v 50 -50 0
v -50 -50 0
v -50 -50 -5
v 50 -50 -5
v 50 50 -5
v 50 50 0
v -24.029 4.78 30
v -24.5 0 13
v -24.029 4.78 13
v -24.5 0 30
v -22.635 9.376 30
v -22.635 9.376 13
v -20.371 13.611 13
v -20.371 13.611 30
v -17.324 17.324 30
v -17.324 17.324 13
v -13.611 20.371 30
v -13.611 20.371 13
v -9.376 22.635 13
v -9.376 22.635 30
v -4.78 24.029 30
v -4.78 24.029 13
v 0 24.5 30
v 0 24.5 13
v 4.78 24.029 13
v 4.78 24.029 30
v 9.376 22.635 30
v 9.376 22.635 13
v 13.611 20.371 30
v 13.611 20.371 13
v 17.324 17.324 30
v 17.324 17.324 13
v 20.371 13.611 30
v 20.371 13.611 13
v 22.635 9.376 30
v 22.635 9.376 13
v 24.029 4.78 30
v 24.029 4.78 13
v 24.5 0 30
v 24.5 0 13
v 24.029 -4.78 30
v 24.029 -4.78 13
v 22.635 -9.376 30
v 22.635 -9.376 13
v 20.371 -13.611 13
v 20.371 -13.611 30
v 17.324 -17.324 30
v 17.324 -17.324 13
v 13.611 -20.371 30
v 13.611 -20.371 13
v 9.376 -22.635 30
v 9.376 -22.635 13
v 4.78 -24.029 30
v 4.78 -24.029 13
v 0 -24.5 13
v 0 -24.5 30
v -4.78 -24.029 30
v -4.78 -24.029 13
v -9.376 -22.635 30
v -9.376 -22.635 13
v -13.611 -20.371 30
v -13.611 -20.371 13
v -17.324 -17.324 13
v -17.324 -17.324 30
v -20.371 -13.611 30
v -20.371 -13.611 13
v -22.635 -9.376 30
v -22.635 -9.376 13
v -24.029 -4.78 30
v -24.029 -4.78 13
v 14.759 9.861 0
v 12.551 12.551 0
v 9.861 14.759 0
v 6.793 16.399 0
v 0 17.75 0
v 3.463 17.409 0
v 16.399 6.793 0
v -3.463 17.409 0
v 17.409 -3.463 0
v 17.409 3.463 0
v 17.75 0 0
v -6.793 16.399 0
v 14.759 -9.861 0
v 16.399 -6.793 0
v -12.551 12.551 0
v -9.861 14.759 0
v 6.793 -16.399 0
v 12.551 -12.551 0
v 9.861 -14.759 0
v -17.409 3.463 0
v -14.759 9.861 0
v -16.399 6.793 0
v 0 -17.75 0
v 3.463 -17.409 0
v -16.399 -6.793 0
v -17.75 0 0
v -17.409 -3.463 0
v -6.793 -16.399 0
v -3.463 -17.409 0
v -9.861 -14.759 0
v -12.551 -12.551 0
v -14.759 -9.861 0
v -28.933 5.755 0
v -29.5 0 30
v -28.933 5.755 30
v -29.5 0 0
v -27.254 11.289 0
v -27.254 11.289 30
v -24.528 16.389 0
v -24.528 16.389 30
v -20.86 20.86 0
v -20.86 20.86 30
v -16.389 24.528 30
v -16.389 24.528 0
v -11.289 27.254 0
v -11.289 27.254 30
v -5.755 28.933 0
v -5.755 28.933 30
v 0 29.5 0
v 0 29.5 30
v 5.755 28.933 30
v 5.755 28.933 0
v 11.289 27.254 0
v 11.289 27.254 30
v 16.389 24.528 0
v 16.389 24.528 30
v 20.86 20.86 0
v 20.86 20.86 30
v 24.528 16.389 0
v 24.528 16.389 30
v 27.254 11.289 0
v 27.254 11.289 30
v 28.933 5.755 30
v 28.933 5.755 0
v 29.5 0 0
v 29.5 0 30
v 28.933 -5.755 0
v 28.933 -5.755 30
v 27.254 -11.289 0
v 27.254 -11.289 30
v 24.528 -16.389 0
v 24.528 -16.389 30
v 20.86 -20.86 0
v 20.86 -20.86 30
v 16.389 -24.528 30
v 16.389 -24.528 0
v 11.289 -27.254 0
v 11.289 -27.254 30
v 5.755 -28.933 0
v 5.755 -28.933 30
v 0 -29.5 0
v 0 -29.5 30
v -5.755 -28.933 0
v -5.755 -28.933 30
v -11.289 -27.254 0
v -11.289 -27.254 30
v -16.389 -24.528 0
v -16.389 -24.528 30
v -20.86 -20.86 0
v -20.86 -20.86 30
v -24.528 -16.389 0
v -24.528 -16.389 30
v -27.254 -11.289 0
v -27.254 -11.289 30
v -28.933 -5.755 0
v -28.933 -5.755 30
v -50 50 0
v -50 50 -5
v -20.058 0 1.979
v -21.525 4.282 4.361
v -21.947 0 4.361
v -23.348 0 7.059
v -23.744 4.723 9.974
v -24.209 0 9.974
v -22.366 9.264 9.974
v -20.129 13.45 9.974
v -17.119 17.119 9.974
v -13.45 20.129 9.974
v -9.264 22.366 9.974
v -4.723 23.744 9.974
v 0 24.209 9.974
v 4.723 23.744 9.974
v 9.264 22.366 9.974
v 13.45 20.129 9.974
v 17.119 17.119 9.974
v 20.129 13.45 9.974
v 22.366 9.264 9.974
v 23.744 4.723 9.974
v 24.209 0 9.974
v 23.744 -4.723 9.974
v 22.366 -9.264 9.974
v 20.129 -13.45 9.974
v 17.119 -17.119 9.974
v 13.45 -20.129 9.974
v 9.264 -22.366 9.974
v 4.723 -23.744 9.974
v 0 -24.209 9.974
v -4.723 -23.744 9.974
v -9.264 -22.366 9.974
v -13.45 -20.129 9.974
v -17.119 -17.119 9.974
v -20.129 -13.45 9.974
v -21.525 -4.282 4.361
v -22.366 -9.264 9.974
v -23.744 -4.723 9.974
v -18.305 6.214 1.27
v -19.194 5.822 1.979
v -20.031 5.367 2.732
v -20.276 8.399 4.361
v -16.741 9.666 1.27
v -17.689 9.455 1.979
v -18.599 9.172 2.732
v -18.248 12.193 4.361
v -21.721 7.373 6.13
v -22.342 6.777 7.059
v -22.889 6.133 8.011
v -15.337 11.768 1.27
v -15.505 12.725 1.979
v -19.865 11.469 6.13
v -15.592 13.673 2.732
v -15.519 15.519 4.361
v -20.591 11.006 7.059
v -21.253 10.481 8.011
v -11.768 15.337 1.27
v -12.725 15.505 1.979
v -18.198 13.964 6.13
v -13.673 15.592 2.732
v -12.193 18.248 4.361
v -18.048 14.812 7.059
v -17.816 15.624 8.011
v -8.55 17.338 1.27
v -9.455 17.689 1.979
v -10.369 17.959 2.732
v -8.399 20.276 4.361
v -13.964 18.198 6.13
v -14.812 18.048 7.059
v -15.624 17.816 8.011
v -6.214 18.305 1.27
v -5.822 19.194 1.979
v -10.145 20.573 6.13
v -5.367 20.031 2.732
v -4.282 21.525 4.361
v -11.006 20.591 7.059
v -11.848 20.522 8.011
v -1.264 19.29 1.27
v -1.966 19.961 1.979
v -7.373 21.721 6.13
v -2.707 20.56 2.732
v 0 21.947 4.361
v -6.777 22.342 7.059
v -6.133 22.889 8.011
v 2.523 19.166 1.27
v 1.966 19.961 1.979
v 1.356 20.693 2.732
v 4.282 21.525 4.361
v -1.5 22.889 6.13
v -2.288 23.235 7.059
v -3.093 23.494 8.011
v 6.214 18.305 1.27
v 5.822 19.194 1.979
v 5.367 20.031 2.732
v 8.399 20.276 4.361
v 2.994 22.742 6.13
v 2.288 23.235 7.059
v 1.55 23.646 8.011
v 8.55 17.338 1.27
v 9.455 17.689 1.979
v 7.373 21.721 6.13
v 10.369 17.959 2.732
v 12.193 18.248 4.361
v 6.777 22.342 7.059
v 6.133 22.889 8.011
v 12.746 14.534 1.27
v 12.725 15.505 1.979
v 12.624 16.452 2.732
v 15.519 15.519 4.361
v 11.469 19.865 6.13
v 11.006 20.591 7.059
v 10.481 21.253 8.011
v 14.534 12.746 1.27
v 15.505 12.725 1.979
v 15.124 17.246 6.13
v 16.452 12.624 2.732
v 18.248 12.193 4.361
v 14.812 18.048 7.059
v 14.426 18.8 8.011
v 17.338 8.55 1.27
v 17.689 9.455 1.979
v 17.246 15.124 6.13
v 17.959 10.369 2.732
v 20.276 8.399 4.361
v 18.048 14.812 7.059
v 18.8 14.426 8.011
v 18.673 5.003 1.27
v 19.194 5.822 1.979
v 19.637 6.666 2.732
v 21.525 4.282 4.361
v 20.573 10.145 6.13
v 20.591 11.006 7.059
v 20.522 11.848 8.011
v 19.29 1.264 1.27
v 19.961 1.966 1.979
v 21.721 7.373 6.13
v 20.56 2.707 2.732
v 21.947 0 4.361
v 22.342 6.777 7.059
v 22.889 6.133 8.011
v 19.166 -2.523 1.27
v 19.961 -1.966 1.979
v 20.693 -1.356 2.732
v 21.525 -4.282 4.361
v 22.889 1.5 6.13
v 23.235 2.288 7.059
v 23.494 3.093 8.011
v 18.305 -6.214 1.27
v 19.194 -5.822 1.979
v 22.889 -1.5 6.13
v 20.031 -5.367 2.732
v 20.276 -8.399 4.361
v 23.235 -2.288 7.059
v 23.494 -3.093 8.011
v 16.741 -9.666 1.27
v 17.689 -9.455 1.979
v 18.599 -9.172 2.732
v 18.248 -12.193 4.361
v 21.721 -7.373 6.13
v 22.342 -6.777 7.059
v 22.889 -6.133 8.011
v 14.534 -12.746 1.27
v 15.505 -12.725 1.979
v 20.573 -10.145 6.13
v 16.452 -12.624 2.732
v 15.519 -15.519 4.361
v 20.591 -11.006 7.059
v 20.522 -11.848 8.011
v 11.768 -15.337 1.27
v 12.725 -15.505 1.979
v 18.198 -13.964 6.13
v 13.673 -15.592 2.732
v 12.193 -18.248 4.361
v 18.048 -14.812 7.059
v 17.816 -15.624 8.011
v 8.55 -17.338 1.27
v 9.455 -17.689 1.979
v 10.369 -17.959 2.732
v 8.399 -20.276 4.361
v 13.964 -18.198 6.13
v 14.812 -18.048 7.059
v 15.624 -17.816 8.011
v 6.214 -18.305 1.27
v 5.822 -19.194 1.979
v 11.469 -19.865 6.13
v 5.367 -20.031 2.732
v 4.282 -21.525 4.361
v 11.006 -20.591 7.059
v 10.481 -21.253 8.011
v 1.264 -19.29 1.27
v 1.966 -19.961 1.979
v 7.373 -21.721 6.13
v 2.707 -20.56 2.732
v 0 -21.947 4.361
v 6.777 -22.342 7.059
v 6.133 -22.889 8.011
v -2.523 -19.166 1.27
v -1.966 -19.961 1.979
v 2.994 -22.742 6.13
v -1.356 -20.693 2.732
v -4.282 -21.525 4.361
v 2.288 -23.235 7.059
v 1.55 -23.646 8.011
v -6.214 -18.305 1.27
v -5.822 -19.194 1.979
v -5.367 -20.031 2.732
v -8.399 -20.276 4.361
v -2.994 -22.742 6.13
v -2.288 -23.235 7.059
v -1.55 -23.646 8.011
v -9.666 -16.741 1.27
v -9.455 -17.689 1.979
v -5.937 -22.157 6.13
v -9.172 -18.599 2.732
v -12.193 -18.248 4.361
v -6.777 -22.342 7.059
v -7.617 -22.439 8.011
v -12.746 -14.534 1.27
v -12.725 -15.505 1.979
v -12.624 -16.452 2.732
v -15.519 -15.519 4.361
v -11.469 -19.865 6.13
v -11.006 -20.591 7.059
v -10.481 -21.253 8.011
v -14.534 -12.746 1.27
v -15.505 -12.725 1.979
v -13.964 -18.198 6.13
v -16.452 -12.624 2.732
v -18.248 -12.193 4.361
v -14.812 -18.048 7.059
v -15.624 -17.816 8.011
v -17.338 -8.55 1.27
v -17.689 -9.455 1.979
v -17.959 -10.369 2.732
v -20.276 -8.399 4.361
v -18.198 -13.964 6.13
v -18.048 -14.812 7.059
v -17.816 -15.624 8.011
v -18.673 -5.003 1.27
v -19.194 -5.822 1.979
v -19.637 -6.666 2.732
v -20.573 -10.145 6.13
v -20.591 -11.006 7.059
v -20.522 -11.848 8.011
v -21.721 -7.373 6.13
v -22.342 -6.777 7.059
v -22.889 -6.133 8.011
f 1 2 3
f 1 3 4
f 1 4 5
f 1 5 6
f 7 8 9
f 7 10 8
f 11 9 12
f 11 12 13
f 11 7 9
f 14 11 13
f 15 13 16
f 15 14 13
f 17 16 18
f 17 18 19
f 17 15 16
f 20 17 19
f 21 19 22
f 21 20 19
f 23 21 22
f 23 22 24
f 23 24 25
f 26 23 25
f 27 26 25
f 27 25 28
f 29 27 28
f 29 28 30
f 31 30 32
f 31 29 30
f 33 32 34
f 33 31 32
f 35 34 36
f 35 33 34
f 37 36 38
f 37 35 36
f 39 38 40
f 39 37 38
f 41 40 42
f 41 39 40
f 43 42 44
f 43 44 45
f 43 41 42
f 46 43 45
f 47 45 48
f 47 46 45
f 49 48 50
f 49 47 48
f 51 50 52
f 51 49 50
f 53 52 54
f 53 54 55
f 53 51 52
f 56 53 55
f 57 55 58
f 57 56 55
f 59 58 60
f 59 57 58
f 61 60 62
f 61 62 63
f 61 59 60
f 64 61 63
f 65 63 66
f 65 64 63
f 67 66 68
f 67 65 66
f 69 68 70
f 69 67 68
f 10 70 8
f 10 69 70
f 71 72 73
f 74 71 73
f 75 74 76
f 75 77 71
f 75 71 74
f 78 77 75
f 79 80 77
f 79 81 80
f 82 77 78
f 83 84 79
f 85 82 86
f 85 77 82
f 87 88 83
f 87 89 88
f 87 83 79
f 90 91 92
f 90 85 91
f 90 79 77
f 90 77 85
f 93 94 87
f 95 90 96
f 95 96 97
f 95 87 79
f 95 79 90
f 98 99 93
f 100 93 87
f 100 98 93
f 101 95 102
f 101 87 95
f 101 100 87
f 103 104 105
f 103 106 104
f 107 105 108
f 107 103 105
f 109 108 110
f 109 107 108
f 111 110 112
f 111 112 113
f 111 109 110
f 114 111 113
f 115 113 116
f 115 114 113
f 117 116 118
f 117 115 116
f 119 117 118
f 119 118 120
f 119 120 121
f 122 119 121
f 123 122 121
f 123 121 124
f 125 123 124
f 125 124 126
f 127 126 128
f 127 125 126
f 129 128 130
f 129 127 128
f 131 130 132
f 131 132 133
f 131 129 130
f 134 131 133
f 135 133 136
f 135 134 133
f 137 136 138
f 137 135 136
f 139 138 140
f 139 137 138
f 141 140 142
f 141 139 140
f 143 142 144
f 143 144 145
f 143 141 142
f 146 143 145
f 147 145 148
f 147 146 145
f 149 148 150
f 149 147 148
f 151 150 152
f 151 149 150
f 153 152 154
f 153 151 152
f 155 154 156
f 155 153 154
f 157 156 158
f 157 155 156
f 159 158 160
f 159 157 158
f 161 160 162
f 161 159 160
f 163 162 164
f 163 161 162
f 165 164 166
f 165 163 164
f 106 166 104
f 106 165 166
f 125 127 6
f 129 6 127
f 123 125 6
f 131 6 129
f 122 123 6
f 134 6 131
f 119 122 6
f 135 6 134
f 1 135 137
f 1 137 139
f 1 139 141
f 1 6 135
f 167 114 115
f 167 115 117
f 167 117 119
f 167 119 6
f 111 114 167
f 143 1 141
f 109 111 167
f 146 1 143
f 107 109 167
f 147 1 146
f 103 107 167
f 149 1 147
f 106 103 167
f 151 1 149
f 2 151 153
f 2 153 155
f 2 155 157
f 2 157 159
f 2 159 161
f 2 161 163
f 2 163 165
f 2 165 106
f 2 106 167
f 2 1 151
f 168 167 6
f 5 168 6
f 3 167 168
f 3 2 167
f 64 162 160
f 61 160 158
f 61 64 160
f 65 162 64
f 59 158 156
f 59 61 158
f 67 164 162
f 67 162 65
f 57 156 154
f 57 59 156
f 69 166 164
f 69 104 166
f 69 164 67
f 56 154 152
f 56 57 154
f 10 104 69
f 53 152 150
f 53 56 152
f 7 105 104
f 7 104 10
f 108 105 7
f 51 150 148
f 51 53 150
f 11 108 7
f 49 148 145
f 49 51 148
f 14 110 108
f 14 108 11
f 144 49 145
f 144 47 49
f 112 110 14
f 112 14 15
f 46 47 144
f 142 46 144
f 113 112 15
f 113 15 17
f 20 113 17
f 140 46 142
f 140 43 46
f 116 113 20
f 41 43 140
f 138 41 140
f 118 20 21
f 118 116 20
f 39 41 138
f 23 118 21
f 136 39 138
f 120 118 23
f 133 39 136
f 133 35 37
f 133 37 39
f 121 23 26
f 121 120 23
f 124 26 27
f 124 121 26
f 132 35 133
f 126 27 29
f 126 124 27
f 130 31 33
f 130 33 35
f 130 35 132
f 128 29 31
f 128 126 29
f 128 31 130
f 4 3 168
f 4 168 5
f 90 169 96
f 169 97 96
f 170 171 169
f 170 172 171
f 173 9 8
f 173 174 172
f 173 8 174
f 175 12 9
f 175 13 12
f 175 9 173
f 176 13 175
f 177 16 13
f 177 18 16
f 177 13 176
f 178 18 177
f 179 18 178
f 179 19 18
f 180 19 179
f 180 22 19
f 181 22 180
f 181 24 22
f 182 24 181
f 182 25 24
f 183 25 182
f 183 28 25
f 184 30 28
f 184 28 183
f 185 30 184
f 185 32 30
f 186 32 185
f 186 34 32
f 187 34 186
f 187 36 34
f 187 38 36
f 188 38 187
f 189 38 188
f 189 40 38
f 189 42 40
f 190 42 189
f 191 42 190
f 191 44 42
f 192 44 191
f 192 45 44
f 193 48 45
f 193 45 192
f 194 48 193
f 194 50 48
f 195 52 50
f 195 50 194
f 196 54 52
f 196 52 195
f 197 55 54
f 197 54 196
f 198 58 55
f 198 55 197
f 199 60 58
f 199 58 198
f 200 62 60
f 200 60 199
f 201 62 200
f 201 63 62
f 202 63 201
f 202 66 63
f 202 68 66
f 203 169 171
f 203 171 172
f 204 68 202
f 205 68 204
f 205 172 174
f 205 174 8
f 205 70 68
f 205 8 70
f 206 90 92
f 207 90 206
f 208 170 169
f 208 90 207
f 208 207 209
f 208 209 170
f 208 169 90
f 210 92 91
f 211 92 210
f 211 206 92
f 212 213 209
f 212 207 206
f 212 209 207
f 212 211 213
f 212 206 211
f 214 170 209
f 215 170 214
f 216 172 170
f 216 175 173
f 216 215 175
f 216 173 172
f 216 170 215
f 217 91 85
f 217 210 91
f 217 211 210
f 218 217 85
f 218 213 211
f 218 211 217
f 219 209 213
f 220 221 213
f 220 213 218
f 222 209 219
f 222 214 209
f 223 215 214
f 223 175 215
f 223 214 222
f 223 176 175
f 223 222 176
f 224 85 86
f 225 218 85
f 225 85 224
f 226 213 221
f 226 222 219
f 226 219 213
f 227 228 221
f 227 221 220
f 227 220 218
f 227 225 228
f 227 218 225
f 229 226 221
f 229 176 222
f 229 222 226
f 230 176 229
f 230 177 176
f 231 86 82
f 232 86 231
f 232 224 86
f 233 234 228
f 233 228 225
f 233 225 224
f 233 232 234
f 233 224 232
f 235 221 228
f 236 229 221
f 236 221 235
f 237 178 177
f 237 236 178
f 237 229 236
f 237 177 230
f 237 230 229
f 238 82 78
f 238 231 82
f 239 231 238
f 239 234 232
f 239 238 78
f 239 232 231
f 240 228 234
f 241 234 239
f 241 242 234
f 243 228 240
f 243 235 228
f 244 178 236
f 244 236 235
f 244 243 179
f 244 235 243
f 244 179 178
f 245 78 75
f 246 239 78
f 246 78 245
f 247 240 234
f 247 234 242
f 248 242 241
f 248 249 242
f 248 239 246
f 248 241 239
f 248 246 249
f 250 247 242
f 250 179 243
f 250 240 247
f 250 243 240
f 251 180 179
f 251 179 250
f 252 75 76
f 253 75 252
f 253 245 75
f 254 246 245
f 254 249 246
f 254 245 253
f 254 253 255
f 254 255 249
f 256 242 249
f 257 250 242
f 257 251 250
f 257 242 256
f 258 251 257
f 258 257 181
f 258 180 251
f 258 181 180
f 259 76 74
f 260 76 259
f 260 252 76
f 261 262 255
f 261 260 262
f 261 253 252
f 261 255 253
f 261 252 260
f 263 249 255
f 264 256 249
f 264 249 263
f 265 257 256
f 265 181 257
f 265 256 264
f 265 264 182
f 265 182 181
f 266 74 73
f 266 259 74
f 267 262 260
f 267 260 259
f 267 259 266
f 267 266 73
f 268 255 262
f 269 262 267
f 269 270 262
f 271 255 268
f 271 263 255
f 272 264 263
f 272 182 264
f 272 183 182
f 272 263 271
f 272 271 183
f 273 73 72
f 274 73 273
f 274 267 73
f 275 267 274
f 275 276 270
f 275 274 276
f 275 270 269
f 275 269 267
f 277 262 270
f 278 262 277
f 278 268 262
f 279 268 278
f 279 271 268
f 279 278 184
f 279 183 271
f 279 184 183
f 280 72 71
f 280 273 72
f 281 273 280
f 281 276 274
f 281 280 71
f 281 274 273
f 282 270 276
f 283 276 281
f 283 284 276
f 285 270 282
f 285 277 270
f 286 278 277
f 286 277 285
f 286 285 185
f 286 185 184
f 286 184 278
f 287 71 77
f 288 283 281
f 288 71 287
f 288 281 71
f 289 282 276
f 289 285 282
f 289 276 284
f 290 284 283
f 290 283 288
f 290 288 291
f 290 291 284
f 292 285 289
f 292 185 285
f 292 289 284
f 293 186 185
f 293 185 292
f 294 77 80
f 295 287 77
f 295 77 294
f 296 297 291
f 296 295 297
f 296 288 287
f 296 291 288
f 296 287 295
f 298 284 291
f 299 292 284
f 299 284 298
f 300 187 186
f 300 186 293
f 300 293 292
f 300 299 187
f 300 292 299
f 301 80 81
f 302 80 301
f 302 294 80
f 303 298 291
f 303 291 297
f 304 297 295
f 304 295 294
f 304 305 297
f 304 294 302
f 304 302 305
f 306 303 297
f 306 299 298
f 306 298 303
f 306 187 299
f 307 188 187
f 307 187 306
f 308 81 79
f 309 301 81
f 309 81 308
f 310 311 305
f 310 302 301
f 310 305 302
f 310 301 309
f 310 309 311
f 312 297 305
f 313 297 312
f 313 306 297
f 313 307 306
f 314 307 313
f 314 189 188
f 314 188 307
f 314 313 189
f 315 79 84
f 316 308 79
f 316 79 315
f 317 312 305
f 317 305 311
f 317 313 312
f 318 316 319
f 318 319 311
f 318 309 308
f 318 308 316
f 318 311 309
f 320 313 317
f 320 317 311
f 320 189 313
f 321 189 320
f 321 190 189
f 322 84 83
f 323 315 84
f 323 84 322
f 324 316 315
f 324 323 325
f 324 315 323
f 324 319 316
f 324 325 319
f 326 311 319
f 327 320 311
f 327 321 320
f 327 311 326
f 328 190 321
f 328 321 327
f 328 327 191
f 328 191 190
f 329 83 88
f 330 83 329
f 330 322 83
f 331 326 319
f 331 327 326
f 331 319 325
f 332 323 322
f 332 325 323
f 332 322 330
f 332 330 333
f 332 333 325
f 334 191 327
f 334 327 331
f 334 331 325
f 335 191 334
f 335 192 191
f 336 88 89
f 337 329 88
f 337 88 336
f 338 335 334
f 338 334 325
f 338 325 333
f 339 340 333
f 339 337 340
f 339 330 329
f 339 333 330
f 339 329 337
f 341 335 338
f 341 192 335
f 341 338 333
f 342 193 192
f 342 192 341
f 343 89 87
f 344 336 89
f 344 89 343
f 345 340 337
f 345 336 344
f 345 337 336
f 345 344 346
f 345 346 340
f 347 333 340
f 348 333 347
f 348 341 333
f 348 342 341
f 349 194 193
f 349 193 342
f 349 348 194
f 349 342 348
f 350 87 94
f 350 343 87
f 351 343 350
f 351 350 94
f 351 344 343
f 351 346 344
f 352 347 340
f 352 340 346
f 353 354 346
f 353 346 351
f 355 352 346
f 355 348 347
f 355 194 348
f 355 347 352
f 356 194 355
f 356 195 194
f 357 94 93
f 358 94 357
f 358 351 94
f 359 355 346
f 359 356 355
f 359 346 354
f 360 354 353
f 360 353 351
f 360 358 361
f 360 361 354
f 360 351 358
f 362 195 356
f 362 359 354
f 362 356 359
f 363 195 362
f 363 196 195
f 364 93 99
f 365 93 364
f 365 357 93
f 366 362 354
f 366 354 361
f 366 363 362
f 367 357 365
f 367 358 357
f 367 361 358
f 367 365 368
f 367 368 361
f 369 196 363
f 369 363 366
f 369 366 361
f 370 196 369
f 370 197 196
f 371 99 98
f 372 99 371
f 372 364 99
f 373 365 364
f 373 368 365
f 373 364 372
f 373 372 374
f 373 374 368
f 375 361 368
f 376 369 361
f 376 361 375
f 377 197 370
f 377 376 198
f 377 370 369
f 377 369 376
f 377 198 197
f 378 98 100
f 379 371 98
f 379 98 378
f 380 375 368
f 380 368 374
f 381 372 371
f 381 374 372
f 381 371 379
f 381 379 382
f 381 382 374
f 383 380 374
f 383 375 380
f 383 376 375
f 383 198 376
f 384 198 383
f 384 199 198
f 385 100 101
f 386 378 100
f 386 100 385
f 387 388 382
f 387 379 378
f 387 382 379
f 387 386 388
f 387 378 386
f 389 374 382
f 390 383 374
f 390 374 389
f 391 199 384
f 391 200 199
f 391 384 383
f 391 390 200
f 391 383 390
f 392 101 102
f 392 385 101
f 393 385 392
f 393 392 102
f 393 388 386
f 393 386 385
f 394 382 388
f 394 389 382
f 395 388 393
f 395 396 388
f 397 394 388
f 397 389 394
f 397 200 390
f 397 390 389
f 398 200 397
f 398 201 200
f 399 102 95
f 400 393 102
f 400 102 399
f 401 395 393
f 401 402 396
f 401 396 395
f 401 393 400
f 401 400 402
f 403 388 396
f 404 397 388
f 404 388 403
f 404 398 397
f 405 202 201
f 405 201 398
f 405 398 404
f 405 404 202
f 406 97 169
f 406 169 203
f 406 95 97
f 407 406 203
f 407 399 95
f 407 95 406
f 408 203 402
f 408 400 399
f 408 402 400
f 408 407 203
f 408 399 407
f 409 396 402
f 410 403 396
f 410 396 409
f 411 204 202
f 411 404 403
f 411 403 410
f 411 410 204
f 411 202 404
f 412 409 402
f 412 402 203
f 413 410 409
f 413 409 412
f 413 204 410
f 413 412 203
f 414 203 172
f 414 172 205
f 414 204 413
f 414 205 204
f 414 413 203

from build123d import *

# Parameters (mm, degrees)
F0_W     = 50
F0_H     = 5
F2_DEPTH = 50


with BuildPart() as f1:
    # F0 (on Front) → F1 (revolve)
    with BuildSketch(Plane.XZ):
        Polygon((-29.5, 0), (-24.5, 0), (-24.5, 13), (-24.5, 30), (-29.5, 30), align=None)
        with BuildLine():
            Line((-24.5, 0), (-17.75, 0))
            ThreePointArc((-17.75, 0), (-22.711917, 5.676024), (-24.5, 13))
            Line((-24.5, 13), (-24.5, 0))
        make_face()
    revolve(axis=Axis((0, 0, -2.5), (0, 0, -1)))

    # F0 (on Front) → F2 (join, symmetric)
    with BuildSketch(Plane.XZ):
        Polygon((0, -5), (0, 0), (-17.75, 0), (-24.5, 0), (-29.5, 0), (-50, 0), (-50, -5), align=None)
        with Locations((25, -2.5)):
            Rectangle(F0_W, F0_H)
    extrude(amount=F2_DEPTH, both=True)


with BuildPart() as f3_1:
    # F3: copy of F1
    add(f1.part)


solid = f1.part
